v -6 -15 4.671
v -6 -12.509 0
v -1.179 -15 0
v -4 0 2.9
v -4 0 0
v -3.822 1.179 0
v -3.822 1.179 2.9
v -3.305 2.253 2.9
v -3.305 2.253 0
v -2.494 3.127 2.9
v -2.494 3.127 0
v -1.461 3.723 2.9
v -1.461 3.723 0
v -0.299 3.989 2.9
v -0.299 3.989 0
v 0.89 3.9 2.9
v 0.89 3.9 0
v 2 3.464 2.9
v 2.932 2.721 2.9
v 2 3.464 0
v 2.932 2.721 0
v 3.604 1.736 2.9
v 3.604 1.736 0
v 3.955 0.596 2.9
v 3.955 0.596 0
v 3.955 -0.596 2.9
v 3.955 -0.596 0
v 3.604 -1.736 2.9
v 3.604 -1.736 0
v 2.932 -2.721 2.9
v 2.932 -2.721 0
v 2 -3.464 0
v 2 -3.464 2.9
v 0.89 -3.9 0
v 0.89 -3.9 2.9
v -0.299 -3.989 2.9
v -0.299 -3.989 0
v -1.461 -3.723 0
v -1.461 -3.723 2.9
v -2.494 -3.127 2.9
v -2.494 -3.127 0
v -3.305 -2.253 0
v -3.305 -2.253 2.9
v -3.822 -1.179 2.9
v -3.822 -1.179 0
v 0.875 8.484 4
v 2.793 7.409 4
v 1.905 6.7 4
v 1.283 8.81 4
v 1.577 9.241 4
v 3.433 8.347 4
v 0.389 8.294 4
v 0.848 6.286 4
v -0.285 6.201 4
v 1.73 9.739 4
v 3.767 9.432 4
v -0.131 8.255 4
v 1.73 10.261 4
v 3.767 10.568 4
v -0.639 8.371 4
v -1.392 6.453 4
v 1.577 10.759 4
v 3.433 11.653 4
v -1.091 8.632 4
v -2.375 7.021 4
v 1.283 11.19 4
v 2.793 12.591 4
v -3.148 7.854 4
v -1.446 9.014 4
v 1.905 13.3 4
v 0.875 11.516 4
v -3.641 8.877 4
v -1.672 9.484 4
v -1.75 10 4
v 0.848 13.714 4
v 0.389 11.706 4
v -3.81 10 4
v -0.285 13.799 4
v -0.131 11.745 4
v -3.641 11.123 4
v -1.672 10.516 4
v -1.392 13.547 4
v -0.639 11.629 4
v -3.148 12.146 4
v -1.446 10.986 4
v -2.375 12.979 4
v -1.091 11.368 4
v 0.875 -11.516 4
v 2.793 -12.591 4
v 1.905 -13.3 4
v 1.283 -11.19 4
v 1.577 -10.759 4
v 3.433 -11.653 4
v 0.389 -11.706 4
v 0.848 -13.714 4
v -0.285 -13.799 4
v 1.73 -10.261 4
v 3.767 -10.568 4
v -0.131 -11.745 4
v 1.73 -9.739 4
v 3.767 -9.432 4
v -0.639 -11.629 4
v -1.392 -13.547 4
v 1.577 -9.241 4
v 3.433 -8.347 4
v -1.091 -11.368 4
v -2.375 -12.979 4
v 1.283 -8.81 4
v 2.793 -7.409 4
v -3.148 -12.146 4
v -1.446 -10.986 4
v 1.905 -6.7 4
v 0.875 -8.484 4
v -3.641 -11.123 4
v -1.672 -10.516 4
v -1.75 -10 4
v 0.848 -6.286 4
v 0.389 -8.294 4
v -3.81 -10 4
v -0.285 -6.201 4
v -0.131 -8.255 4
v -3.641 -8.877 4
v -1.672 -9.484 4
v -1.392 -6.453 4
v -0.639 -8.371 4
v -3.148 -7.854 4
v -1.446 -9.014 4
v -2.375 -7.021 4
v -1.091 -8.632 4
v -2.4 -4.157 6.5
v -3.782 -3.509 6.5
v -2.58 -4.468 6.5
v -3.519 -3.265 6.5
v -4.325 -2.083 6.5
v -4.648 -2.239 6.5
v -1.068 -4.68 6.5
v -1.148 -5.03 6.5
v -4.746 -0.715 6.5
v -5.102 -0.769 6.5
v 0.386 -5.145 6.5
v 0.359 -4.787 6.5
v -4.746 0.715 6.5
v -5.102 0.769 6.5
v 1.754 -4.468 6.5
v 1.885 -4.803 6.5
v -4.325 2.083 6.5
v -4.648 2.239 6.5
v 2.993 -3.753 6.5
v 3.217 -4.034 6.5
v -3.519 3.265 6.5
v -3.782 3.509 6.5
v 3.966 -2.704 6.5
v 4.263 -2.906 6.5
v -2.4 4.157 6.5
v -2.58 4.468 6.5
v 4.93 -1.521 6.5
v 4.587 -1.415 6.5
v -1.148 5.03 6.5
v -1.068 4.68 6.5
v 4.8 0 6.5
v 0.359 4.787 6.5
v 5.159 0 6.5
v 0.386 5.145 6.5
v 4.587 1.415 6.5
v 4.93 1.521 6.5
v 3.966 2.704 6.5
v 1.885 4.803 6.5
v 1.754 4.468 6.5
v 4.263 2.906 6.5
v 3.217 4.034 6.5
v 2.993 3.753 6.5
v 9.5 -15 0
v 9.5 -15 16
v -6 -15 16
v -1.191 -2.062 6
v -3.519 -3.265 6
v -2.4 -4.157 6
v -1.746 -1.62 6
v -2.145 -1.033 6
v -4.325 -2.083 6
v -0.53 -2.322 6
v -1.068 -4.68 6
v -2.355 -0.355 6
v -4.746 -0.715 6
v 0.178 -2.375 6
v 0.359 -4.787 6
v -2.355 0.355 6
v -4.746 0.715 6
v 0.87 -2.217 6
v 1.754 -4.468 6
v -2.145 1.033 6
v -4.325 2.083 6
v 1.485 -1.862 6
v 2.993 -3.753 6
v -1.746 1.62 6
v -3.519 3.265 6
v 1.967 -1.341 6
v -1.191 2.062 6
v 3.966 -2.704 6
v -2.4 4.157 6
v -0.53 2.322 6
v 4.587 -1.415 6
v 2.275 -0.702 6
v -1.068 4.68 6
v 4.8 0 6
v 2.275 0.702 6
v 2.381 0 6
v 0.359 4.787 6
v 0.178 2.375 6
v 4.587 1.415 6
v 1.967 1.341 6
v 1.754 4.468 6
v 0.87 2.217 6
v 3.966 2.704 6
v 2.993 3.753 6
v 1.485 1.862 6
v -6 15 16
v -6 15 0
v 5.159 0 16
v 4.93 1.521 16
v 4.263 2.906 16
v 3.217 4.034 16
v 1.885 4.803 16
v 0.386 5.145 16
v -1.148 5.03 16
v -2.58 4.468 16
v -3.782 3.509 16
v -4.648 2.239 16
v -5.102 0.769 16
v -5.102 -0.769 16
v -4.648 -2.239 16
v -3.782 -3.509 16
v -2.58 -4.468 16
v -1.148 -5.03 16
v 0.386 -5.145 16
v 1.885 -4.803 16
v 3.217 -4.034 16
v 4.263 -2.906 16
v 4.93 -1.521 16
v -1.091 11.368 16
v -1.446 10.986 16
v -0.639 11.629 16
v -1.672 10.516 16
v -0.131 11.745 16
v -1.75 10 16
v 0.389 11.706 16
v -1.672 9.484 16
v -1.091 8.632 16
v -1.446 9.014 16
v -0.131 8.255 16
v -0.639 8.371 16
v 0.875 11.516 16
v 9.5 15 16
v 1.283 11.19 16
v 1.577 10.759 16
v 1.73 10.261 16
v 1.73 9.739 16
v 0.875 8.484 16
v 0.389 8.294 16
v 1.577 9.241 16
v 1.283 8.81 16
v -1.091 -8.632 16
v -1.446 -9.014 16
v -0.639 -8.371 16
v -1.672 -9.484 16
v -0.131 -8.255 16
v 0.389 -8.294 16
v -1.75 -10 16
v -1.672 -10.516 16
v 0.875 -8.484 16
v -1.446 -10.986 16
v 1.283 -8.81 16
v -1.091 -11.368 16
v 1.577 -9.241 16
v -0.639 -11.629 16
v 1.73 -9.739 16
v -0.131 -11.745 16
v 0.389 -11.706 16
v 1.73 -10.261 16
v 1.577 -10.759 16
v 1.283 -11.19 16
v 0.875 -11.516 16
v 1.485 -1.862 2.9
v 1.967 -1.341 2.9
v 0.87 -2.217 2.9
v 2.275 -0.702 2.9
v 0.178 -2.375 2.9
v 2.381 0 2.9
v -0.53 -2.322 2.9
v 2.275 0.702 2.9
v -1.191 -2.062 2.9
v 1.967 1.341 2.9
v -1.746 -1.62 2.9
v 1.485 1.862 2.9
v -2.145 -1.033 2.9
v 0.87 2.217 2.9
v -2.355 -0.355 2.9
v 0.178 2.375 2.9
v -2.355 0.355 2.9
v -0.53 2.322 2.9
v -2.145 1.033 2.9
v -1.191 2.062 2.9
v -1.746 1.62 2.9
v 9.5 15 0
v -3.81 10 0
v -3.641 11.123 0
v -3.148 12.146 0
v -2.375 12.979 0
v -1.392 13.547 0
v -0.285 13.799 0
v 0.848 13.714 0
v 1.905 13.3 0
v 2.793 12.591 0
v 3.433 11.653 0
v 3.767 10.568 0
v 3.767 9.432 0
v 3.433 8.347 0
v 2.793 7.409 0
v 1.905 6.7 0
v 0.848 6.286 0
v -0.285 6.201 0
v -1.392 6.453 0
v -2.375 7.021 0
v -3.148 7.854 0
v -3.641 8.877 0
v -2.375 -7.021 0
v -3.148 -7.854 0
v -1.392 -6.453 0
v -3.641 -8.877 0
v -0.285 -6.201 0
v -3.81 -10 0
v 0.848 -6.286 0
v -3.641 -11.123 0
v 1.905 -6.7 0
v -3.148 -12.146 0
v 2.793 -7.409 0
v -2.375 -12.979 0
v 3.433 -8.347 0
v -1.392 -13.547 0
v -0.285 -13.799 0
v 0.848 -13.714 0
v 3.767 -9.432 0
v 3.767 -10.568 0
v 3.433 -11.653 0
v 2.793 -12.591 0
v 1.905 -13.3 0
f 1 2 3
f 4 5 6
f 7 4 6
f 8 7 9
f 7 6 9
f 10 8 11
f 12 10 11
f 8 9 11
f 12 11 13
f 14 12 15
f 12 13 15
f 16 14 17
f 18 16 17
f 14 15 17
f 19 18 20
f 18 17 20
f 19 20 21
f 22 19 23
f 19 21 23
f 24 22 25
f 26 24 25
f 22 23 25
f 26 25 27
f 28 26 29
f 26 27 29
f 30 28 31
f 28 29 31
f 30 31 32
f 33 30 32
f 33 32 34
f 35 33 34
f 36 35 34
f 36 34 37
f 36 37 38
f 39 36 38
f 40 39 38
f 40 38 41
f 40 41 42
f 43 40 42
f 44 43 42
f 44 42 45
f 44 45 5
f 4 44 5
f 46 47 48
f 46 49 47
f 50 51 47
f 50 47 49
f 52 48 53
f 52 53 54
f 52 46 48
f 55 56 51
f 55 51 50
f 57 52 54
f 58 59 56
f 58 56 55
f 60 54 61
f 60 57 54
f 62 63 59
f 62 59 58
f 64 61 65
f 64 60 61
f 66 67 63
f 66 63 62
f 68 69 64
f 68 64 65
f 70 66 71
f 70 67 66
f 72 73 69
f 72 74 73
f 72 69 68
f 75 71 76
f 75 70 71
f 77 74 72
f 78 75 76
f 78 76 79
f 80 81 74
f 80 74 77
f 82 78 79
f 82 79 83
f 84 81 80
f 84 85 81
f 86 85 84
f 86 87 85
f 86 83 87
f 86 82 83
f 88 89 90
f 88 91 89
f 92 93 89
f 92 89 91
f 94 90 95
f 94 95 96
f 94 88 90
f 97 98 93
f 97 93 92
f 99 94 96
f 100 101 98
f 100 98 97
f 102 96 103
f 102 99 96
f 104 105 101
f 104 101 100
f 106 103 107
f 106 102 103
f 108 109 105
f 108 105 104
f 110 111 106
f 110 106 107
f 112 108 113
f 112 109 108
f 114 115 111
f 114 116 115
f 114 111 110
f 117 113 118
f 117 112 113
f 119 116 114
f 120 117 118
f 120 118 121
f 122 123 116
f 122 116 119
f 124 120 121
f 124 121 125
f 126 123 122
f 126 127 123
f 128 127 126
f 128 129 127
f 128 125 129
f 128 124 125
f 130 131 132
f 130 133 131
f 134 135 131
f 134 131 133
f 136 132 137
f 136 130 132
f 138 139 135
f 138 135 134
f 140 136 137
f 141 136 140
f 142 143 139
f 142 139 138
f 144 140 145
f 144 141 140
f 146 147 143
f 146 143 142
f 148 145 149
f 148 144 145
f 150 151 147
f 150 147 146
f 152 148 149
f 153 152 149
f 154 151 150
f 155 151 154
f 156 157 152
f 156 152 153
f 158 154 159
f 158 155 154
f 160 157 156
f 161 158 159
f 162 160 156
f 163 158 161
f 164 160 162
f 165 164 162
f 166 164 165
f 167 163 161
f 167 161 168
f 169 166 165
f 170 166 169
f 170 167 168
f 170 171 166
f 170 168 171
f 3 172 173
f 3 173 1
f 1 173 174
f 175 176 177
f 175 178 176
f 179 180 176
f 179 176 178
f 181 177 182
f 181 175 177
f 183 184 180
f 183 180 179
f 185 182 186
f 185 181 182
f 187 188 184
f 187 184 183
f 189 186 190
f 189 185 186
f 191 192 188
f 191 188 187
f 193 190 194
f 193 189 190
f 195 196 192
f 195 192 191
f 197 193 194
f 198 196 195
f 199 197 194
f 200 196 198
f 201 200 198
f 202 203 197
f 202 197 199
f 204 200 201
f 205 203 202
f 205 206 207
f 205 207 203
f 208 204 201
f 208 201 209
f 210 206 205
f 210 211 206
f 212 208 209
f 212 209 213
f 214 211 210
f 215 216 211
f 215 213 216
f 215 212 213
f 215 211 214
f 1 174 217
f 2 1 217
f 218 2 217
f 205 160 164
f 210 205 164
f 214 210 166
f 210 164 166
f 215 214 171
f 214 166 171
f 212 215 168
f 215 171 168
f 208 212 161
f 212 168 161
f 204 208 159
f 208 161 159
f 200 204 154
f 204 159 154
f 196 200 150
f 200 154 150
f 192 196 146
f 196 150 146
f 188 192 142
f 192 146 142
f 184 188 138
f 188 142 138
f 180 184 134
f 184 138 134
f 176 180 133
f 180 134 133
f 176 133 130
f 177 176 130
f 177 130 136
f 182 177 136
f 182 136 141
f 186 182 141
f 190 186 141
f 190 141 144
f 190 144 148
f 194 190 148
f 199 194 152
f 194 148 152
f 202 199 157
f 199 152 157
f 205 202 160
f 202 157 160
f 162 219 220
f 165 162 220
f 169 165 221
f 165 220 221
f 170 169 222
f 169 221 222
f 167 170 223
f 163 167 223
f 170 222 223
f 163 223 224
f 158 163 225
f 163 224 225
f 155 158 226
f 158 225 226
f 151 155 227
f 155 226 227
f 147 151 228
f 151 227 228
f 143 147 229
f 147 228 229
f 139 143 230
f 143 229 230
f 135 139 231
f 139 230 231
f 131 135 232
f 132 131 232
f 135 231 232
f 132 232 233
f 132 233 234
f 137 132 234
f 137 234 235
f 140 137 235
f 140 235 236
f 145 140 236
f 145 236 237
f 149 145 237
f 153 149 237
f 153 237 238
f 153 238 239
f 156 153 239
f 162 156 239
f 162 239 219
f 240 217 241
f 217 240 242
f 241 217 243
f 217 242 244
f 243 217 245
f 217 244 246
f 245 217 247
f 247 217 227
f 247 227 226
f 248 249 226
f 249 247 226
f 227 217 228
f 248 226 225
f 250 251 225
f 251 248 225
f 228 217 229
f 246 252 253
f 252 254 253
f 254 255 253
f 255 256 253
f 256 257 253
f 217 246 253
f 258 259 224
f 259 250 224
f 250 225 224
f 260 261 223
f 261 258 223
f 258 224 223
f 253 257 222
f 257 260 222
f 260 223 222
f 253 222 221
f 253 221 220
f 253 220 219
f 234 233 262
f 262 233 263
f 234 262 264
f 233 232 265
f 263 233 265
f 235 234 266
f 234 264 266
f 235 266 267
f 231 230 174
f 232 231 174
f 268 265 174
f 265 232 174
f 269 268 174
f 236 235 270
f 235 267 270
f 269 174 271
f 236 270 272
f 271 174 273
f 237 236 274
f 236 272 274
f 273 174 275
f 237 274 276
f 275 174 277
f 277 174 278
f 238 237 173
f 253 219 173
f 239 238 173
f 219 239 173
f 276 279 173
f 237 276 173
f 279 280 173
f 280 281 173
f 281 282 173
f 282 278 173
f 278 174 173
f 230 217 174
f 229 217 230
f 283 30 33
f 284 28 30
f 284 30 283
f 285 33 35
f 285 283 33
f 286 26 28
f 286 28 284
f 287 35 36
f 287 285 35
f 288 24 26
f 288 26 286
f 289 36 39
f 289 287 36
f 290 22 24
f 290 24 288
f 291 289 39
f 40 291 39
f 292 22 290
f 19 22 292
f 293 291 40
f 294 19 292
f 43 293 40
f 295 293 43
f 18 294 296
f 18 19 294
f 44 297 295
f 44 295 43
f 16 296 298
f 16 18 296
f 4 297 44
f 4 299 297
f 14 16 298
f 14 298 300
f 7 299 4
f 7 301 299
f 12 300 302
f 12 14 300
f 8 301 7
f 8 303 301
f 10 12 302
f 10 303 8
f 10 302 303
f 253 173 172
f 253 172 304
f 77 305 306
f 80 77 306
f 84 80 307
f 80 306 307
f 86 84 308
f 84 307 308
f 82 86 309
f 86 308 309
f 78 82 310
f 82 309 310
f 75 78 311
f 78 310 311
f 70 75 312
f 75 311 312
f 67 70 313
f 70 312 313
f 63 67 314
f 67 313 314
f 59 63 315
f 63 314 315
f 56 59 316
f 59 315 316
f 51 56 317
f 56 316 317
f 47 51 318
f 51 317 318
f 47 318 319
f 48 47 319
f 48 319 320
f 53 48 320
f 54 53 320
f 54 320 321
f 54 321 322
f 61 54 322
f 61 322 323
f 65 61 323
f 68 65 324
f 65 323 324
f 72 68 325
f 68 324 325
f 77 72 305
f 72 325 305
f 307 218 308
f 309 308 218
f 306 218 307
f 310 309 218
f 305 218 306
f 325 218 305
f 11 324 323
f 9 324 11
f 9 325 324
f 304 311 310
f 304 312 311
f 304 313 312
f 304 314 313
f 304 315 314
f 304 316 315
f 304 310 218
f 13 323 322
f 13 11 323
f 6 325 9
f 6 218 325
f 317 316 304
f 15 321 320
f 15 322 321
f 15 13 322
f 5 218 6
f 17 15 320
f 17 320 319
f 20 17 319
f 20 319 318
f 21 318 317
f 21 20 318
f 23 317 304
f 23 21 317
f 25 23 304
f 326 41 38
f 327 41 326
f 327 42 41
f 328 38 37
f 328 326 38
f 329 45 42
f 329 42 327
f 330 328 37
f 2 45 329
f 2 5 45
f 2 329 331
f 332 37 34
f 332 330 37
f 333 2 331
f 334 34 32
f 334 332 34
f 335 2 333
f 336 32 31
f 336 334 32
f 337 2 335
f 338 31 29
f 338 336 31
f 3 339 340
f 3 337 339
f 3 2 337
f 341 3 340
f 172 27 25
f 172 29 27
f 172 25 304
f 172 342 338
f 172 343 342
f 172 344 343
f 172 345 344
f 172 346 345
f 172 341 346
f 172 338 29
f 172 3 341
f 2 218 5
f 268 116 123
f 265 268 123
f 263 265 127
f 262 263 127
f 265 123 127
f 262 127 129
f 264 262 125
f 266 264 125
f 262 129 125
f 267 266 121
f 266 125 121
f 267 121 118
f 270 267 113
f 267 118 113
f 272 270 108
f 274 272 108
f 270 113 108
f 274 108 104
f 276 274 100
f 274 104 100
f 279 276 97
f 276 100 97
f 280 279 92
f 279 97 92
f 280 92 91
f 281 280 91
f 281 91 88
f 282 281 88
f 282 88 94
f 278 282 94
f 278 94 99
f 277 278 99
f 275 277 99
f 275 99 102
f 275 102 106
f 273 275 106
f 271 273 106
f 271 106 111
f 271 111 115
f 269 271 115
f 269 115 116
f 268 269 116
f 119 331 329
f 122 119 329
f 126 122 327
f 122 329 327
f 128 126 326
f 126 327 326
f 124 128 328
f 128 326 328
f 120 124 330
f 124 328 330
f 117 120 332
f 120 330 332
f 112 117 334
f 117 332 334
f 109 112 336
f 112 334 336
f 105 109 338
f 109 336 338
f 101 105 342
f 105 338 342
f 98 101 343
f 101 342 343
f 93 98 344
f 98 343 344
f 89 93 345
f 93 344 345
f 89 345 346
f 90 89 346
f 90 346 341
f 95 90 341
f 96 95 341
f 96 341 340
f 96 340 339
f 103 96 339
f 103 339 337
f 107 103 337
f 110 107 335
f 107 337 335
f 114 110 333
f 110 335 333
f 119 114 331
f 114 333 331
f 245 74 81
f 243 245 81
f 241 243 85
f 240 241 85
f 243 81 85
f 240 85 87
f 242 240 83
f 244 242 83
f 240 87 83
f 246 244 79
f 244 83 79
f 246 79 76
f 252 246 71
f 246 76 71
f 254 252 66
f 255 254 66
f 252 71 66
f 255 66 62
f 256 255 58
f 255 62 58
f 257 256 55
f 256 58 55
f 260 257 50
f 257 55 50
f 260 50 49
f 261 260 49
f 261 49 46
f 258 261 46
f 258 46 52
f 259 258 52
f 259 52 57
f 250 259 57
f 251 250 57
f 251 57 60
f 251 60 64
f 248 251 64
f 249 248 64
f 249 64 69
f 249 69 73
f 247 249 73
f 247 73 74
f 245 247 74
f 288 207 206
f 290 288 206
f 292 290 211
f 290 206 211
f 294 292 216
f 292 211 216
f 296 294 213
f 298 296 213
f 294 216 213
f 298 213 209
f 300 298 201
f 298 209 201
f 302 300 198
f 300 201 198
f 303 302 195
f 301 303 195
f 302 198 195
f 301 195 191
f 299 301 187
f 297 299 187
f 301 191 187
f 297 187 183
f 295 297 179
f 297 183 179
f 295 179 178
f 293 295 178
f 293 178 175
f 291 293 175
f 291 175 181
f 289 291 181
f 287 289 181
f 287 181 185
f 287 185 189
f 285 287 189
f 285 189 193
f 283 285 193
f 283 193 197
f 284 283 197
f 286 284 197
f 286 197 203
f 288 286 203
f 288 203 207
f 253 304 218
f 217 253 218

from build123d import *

# Parameters (mm, degrees)
SKETCH1_W               = 19
SKETCH1_H               = 30
BOSS_EXTRUDE1_DEPTH     = 18
SKETCH2_R               = 5.159375
CUT_EXTRUDE1_DEPTH      = 11.5
SKETCH4_R               = 4.8
CUT_EXTRUDE3_DEPTH      = 0.5
SKETCH5_R               = 2.38125
CUT_EXTRUDE4_DEPTH      = 13
CUT_EXTRUDE4_DEPTH_BACK = 8
CUT_EXTRUDE6_DEPTH      = 19
CUT_EXTRUDE6_DEPTH_BACK = 1
SKETCH11_W              = 15.5
SKETCH11_H              = 30
BOSS_EXTRUDE5_DEPTH     = 5
SKETCH12_R              = 4
CUT_EXTRUDE8_DEPTH      = 7.9
SKETCH13_R              = 1.75
CUT_EXTRUDE9_DEPTH      = 24
SKETCH15_W              = 15.5
SKETCH15_H              = 2
SKETCH15_H_2            = 5
CUT_EXTRUDE11_DEPTH     = 41
SKETCH17_R              = 5
CUT_EXTRUDE12_DEPTH     = 2
SKETCH20_R              = 3.81
CUT_EXTRUDE13_DEPTH     = 4


with BuildPart() as part:
    # Sketch1 → Boss-Extrude1 (new body)
    with BuildSketch(Plane.XY):
        Rectangle(SKETCH1_W, SKETCH1_H)
    extrude(amount=BOSS_EXTRUDE1_DEPTH)

    # Sketch2 → Cut-Extrude1 (cut)
    with BuildSketch(Plane.XY.offset(18)):
        Circle(SKETCH2_R)
    extrude(amount=-CUT_EXTRUDE1_DEPTH, mode=Mode.SUBTRACT)

    # Sketch4 → Cut-Extrude3 (cut)
    with BuildSketch(Plane.XY.offset(6.5)):
        Circle(SKETCH4_R)
    extrude(amount=-CUT_EXTRUDE3_DEPTH, mode=Mode.SUBTRACT)

    # Sketch5 → Cut-Extrude4 (cut, two sides)
    with BuildSketch(Plane.XY.offset(6)) as cut_extrude4_sk:
        Circle(SKETCH5_R)
    extrude(amount=CUT_EXTRUDE4_DEPTH, mode=Mode.SUBTRACT)
    extrude(cut_extrude4_sk.sketch, amount=-CUT_EXTRUDE4_DEPTH_BACK, mode=Mode.SUBTRACT)

    # Sketch6 → Cut-Extrude6 (cut, two sides)
    with BuildSketch(Plane.XY) as cut_extrude6_sk:
        Polygon((-6, 92.53517602), (-6, 15), (-6, -15), (-6, -92.53517602), (-161.070352039, -92.53517602), (-161.070352039, 92.53517602), align=None)
    extrude(amount=CUT_EXTRUDE6_DEPTH, mode=Mode.SUBTRACT)
    extrude(cut_extrude6_sk.sketch, amount=-CUT_EXTRUDE6_DEPTH_BACK, mode=Mode.SUBTRACT)

    # Sketch11 → Boss-Extrude5 (add)
    with BuildSketch(Plane(origin=(0, 0, 0), x_dir=(-1, 0, 0), z_dir=(0, 0, -1))):
        with Locations((-1.75, 0)):
            Rectangle(SKETCH11_W, SKETCH11_H)
    extrude(amount=BOSS_EXTRUDE5_DEPTH)

    # Sketch12 → Cut-Extrude8 (cut)
    with BuildSketch(Plane(origin=(0, 0, -5), x_dir=(-1, 0, 0), z_dir=(0, 0, -1))):
        Circle(SKETCH12_R)
    extrude(amount=-CUT_EXTRUDE8_DEPTH, mode=Mode.SUBTRACT)

    # Sketch13 → Cut-Extrude9 (cut, through all)
    with BuildSketch(Plane(origin=(0, 0, -5), x_dir=(-1, 0, 0), z_dir=(0, 0, -1))):
        with Locations((0, -10)):
            Circle(SKETCH13_R)
        with Locations((0, 10)):
            Circle(SKETCH13_R)
    extrude(amount=-CUT_EXTRUDE9_DEPTH, mode=Mode.SUBTRACT)

    # Sketch15 → Cut-Extrude11 (cut)
    with BuildSketch(Plane.XZ.offset(15)):
        with Locations((1.75, 17)):
            Rectangle(SKETCH15_W, SKETCH15_H)
        with Locations((1.75, -2.5)):
            Rectangle(SKETCH15_W, SKETCH15_H_2)
    extrude(amount=-CUT_EXTRUDE11_DEPTH, mode=Mode.SUBTRACT)

    # Sketch17 → Cut-Extrude12 (cut)
    with BuildSketch(Plane(origin=(-6, -15, 0), x_dir=(0.909907666, -0.366009572, -0.195205105), z_dir=(0.414810848, 0.802859705, 0.428191843))):
        Circle(SKETCH17_R)
    extrude(amount=CUT_EXTRUDE12_DEPTH, mode=Mode.SUBTRACT)

    # Sketch20 → Cut-Extrude13 (cut)
    with BuildSketch(Plane(origin=(0, 0, 0), x_dir=(-1, 0, 0), z_dir=(0, 0, -1))):
        with Locations((0, 10)):
            Circle(SKETCH20_R)
        with Locations((0, -10)):
            Circle(SKETCH20_R)
    extrude(amount=-CUT_EXTRUDE13_DEPTH, mode=Mode.SUBTRACT)


solid = part.part
